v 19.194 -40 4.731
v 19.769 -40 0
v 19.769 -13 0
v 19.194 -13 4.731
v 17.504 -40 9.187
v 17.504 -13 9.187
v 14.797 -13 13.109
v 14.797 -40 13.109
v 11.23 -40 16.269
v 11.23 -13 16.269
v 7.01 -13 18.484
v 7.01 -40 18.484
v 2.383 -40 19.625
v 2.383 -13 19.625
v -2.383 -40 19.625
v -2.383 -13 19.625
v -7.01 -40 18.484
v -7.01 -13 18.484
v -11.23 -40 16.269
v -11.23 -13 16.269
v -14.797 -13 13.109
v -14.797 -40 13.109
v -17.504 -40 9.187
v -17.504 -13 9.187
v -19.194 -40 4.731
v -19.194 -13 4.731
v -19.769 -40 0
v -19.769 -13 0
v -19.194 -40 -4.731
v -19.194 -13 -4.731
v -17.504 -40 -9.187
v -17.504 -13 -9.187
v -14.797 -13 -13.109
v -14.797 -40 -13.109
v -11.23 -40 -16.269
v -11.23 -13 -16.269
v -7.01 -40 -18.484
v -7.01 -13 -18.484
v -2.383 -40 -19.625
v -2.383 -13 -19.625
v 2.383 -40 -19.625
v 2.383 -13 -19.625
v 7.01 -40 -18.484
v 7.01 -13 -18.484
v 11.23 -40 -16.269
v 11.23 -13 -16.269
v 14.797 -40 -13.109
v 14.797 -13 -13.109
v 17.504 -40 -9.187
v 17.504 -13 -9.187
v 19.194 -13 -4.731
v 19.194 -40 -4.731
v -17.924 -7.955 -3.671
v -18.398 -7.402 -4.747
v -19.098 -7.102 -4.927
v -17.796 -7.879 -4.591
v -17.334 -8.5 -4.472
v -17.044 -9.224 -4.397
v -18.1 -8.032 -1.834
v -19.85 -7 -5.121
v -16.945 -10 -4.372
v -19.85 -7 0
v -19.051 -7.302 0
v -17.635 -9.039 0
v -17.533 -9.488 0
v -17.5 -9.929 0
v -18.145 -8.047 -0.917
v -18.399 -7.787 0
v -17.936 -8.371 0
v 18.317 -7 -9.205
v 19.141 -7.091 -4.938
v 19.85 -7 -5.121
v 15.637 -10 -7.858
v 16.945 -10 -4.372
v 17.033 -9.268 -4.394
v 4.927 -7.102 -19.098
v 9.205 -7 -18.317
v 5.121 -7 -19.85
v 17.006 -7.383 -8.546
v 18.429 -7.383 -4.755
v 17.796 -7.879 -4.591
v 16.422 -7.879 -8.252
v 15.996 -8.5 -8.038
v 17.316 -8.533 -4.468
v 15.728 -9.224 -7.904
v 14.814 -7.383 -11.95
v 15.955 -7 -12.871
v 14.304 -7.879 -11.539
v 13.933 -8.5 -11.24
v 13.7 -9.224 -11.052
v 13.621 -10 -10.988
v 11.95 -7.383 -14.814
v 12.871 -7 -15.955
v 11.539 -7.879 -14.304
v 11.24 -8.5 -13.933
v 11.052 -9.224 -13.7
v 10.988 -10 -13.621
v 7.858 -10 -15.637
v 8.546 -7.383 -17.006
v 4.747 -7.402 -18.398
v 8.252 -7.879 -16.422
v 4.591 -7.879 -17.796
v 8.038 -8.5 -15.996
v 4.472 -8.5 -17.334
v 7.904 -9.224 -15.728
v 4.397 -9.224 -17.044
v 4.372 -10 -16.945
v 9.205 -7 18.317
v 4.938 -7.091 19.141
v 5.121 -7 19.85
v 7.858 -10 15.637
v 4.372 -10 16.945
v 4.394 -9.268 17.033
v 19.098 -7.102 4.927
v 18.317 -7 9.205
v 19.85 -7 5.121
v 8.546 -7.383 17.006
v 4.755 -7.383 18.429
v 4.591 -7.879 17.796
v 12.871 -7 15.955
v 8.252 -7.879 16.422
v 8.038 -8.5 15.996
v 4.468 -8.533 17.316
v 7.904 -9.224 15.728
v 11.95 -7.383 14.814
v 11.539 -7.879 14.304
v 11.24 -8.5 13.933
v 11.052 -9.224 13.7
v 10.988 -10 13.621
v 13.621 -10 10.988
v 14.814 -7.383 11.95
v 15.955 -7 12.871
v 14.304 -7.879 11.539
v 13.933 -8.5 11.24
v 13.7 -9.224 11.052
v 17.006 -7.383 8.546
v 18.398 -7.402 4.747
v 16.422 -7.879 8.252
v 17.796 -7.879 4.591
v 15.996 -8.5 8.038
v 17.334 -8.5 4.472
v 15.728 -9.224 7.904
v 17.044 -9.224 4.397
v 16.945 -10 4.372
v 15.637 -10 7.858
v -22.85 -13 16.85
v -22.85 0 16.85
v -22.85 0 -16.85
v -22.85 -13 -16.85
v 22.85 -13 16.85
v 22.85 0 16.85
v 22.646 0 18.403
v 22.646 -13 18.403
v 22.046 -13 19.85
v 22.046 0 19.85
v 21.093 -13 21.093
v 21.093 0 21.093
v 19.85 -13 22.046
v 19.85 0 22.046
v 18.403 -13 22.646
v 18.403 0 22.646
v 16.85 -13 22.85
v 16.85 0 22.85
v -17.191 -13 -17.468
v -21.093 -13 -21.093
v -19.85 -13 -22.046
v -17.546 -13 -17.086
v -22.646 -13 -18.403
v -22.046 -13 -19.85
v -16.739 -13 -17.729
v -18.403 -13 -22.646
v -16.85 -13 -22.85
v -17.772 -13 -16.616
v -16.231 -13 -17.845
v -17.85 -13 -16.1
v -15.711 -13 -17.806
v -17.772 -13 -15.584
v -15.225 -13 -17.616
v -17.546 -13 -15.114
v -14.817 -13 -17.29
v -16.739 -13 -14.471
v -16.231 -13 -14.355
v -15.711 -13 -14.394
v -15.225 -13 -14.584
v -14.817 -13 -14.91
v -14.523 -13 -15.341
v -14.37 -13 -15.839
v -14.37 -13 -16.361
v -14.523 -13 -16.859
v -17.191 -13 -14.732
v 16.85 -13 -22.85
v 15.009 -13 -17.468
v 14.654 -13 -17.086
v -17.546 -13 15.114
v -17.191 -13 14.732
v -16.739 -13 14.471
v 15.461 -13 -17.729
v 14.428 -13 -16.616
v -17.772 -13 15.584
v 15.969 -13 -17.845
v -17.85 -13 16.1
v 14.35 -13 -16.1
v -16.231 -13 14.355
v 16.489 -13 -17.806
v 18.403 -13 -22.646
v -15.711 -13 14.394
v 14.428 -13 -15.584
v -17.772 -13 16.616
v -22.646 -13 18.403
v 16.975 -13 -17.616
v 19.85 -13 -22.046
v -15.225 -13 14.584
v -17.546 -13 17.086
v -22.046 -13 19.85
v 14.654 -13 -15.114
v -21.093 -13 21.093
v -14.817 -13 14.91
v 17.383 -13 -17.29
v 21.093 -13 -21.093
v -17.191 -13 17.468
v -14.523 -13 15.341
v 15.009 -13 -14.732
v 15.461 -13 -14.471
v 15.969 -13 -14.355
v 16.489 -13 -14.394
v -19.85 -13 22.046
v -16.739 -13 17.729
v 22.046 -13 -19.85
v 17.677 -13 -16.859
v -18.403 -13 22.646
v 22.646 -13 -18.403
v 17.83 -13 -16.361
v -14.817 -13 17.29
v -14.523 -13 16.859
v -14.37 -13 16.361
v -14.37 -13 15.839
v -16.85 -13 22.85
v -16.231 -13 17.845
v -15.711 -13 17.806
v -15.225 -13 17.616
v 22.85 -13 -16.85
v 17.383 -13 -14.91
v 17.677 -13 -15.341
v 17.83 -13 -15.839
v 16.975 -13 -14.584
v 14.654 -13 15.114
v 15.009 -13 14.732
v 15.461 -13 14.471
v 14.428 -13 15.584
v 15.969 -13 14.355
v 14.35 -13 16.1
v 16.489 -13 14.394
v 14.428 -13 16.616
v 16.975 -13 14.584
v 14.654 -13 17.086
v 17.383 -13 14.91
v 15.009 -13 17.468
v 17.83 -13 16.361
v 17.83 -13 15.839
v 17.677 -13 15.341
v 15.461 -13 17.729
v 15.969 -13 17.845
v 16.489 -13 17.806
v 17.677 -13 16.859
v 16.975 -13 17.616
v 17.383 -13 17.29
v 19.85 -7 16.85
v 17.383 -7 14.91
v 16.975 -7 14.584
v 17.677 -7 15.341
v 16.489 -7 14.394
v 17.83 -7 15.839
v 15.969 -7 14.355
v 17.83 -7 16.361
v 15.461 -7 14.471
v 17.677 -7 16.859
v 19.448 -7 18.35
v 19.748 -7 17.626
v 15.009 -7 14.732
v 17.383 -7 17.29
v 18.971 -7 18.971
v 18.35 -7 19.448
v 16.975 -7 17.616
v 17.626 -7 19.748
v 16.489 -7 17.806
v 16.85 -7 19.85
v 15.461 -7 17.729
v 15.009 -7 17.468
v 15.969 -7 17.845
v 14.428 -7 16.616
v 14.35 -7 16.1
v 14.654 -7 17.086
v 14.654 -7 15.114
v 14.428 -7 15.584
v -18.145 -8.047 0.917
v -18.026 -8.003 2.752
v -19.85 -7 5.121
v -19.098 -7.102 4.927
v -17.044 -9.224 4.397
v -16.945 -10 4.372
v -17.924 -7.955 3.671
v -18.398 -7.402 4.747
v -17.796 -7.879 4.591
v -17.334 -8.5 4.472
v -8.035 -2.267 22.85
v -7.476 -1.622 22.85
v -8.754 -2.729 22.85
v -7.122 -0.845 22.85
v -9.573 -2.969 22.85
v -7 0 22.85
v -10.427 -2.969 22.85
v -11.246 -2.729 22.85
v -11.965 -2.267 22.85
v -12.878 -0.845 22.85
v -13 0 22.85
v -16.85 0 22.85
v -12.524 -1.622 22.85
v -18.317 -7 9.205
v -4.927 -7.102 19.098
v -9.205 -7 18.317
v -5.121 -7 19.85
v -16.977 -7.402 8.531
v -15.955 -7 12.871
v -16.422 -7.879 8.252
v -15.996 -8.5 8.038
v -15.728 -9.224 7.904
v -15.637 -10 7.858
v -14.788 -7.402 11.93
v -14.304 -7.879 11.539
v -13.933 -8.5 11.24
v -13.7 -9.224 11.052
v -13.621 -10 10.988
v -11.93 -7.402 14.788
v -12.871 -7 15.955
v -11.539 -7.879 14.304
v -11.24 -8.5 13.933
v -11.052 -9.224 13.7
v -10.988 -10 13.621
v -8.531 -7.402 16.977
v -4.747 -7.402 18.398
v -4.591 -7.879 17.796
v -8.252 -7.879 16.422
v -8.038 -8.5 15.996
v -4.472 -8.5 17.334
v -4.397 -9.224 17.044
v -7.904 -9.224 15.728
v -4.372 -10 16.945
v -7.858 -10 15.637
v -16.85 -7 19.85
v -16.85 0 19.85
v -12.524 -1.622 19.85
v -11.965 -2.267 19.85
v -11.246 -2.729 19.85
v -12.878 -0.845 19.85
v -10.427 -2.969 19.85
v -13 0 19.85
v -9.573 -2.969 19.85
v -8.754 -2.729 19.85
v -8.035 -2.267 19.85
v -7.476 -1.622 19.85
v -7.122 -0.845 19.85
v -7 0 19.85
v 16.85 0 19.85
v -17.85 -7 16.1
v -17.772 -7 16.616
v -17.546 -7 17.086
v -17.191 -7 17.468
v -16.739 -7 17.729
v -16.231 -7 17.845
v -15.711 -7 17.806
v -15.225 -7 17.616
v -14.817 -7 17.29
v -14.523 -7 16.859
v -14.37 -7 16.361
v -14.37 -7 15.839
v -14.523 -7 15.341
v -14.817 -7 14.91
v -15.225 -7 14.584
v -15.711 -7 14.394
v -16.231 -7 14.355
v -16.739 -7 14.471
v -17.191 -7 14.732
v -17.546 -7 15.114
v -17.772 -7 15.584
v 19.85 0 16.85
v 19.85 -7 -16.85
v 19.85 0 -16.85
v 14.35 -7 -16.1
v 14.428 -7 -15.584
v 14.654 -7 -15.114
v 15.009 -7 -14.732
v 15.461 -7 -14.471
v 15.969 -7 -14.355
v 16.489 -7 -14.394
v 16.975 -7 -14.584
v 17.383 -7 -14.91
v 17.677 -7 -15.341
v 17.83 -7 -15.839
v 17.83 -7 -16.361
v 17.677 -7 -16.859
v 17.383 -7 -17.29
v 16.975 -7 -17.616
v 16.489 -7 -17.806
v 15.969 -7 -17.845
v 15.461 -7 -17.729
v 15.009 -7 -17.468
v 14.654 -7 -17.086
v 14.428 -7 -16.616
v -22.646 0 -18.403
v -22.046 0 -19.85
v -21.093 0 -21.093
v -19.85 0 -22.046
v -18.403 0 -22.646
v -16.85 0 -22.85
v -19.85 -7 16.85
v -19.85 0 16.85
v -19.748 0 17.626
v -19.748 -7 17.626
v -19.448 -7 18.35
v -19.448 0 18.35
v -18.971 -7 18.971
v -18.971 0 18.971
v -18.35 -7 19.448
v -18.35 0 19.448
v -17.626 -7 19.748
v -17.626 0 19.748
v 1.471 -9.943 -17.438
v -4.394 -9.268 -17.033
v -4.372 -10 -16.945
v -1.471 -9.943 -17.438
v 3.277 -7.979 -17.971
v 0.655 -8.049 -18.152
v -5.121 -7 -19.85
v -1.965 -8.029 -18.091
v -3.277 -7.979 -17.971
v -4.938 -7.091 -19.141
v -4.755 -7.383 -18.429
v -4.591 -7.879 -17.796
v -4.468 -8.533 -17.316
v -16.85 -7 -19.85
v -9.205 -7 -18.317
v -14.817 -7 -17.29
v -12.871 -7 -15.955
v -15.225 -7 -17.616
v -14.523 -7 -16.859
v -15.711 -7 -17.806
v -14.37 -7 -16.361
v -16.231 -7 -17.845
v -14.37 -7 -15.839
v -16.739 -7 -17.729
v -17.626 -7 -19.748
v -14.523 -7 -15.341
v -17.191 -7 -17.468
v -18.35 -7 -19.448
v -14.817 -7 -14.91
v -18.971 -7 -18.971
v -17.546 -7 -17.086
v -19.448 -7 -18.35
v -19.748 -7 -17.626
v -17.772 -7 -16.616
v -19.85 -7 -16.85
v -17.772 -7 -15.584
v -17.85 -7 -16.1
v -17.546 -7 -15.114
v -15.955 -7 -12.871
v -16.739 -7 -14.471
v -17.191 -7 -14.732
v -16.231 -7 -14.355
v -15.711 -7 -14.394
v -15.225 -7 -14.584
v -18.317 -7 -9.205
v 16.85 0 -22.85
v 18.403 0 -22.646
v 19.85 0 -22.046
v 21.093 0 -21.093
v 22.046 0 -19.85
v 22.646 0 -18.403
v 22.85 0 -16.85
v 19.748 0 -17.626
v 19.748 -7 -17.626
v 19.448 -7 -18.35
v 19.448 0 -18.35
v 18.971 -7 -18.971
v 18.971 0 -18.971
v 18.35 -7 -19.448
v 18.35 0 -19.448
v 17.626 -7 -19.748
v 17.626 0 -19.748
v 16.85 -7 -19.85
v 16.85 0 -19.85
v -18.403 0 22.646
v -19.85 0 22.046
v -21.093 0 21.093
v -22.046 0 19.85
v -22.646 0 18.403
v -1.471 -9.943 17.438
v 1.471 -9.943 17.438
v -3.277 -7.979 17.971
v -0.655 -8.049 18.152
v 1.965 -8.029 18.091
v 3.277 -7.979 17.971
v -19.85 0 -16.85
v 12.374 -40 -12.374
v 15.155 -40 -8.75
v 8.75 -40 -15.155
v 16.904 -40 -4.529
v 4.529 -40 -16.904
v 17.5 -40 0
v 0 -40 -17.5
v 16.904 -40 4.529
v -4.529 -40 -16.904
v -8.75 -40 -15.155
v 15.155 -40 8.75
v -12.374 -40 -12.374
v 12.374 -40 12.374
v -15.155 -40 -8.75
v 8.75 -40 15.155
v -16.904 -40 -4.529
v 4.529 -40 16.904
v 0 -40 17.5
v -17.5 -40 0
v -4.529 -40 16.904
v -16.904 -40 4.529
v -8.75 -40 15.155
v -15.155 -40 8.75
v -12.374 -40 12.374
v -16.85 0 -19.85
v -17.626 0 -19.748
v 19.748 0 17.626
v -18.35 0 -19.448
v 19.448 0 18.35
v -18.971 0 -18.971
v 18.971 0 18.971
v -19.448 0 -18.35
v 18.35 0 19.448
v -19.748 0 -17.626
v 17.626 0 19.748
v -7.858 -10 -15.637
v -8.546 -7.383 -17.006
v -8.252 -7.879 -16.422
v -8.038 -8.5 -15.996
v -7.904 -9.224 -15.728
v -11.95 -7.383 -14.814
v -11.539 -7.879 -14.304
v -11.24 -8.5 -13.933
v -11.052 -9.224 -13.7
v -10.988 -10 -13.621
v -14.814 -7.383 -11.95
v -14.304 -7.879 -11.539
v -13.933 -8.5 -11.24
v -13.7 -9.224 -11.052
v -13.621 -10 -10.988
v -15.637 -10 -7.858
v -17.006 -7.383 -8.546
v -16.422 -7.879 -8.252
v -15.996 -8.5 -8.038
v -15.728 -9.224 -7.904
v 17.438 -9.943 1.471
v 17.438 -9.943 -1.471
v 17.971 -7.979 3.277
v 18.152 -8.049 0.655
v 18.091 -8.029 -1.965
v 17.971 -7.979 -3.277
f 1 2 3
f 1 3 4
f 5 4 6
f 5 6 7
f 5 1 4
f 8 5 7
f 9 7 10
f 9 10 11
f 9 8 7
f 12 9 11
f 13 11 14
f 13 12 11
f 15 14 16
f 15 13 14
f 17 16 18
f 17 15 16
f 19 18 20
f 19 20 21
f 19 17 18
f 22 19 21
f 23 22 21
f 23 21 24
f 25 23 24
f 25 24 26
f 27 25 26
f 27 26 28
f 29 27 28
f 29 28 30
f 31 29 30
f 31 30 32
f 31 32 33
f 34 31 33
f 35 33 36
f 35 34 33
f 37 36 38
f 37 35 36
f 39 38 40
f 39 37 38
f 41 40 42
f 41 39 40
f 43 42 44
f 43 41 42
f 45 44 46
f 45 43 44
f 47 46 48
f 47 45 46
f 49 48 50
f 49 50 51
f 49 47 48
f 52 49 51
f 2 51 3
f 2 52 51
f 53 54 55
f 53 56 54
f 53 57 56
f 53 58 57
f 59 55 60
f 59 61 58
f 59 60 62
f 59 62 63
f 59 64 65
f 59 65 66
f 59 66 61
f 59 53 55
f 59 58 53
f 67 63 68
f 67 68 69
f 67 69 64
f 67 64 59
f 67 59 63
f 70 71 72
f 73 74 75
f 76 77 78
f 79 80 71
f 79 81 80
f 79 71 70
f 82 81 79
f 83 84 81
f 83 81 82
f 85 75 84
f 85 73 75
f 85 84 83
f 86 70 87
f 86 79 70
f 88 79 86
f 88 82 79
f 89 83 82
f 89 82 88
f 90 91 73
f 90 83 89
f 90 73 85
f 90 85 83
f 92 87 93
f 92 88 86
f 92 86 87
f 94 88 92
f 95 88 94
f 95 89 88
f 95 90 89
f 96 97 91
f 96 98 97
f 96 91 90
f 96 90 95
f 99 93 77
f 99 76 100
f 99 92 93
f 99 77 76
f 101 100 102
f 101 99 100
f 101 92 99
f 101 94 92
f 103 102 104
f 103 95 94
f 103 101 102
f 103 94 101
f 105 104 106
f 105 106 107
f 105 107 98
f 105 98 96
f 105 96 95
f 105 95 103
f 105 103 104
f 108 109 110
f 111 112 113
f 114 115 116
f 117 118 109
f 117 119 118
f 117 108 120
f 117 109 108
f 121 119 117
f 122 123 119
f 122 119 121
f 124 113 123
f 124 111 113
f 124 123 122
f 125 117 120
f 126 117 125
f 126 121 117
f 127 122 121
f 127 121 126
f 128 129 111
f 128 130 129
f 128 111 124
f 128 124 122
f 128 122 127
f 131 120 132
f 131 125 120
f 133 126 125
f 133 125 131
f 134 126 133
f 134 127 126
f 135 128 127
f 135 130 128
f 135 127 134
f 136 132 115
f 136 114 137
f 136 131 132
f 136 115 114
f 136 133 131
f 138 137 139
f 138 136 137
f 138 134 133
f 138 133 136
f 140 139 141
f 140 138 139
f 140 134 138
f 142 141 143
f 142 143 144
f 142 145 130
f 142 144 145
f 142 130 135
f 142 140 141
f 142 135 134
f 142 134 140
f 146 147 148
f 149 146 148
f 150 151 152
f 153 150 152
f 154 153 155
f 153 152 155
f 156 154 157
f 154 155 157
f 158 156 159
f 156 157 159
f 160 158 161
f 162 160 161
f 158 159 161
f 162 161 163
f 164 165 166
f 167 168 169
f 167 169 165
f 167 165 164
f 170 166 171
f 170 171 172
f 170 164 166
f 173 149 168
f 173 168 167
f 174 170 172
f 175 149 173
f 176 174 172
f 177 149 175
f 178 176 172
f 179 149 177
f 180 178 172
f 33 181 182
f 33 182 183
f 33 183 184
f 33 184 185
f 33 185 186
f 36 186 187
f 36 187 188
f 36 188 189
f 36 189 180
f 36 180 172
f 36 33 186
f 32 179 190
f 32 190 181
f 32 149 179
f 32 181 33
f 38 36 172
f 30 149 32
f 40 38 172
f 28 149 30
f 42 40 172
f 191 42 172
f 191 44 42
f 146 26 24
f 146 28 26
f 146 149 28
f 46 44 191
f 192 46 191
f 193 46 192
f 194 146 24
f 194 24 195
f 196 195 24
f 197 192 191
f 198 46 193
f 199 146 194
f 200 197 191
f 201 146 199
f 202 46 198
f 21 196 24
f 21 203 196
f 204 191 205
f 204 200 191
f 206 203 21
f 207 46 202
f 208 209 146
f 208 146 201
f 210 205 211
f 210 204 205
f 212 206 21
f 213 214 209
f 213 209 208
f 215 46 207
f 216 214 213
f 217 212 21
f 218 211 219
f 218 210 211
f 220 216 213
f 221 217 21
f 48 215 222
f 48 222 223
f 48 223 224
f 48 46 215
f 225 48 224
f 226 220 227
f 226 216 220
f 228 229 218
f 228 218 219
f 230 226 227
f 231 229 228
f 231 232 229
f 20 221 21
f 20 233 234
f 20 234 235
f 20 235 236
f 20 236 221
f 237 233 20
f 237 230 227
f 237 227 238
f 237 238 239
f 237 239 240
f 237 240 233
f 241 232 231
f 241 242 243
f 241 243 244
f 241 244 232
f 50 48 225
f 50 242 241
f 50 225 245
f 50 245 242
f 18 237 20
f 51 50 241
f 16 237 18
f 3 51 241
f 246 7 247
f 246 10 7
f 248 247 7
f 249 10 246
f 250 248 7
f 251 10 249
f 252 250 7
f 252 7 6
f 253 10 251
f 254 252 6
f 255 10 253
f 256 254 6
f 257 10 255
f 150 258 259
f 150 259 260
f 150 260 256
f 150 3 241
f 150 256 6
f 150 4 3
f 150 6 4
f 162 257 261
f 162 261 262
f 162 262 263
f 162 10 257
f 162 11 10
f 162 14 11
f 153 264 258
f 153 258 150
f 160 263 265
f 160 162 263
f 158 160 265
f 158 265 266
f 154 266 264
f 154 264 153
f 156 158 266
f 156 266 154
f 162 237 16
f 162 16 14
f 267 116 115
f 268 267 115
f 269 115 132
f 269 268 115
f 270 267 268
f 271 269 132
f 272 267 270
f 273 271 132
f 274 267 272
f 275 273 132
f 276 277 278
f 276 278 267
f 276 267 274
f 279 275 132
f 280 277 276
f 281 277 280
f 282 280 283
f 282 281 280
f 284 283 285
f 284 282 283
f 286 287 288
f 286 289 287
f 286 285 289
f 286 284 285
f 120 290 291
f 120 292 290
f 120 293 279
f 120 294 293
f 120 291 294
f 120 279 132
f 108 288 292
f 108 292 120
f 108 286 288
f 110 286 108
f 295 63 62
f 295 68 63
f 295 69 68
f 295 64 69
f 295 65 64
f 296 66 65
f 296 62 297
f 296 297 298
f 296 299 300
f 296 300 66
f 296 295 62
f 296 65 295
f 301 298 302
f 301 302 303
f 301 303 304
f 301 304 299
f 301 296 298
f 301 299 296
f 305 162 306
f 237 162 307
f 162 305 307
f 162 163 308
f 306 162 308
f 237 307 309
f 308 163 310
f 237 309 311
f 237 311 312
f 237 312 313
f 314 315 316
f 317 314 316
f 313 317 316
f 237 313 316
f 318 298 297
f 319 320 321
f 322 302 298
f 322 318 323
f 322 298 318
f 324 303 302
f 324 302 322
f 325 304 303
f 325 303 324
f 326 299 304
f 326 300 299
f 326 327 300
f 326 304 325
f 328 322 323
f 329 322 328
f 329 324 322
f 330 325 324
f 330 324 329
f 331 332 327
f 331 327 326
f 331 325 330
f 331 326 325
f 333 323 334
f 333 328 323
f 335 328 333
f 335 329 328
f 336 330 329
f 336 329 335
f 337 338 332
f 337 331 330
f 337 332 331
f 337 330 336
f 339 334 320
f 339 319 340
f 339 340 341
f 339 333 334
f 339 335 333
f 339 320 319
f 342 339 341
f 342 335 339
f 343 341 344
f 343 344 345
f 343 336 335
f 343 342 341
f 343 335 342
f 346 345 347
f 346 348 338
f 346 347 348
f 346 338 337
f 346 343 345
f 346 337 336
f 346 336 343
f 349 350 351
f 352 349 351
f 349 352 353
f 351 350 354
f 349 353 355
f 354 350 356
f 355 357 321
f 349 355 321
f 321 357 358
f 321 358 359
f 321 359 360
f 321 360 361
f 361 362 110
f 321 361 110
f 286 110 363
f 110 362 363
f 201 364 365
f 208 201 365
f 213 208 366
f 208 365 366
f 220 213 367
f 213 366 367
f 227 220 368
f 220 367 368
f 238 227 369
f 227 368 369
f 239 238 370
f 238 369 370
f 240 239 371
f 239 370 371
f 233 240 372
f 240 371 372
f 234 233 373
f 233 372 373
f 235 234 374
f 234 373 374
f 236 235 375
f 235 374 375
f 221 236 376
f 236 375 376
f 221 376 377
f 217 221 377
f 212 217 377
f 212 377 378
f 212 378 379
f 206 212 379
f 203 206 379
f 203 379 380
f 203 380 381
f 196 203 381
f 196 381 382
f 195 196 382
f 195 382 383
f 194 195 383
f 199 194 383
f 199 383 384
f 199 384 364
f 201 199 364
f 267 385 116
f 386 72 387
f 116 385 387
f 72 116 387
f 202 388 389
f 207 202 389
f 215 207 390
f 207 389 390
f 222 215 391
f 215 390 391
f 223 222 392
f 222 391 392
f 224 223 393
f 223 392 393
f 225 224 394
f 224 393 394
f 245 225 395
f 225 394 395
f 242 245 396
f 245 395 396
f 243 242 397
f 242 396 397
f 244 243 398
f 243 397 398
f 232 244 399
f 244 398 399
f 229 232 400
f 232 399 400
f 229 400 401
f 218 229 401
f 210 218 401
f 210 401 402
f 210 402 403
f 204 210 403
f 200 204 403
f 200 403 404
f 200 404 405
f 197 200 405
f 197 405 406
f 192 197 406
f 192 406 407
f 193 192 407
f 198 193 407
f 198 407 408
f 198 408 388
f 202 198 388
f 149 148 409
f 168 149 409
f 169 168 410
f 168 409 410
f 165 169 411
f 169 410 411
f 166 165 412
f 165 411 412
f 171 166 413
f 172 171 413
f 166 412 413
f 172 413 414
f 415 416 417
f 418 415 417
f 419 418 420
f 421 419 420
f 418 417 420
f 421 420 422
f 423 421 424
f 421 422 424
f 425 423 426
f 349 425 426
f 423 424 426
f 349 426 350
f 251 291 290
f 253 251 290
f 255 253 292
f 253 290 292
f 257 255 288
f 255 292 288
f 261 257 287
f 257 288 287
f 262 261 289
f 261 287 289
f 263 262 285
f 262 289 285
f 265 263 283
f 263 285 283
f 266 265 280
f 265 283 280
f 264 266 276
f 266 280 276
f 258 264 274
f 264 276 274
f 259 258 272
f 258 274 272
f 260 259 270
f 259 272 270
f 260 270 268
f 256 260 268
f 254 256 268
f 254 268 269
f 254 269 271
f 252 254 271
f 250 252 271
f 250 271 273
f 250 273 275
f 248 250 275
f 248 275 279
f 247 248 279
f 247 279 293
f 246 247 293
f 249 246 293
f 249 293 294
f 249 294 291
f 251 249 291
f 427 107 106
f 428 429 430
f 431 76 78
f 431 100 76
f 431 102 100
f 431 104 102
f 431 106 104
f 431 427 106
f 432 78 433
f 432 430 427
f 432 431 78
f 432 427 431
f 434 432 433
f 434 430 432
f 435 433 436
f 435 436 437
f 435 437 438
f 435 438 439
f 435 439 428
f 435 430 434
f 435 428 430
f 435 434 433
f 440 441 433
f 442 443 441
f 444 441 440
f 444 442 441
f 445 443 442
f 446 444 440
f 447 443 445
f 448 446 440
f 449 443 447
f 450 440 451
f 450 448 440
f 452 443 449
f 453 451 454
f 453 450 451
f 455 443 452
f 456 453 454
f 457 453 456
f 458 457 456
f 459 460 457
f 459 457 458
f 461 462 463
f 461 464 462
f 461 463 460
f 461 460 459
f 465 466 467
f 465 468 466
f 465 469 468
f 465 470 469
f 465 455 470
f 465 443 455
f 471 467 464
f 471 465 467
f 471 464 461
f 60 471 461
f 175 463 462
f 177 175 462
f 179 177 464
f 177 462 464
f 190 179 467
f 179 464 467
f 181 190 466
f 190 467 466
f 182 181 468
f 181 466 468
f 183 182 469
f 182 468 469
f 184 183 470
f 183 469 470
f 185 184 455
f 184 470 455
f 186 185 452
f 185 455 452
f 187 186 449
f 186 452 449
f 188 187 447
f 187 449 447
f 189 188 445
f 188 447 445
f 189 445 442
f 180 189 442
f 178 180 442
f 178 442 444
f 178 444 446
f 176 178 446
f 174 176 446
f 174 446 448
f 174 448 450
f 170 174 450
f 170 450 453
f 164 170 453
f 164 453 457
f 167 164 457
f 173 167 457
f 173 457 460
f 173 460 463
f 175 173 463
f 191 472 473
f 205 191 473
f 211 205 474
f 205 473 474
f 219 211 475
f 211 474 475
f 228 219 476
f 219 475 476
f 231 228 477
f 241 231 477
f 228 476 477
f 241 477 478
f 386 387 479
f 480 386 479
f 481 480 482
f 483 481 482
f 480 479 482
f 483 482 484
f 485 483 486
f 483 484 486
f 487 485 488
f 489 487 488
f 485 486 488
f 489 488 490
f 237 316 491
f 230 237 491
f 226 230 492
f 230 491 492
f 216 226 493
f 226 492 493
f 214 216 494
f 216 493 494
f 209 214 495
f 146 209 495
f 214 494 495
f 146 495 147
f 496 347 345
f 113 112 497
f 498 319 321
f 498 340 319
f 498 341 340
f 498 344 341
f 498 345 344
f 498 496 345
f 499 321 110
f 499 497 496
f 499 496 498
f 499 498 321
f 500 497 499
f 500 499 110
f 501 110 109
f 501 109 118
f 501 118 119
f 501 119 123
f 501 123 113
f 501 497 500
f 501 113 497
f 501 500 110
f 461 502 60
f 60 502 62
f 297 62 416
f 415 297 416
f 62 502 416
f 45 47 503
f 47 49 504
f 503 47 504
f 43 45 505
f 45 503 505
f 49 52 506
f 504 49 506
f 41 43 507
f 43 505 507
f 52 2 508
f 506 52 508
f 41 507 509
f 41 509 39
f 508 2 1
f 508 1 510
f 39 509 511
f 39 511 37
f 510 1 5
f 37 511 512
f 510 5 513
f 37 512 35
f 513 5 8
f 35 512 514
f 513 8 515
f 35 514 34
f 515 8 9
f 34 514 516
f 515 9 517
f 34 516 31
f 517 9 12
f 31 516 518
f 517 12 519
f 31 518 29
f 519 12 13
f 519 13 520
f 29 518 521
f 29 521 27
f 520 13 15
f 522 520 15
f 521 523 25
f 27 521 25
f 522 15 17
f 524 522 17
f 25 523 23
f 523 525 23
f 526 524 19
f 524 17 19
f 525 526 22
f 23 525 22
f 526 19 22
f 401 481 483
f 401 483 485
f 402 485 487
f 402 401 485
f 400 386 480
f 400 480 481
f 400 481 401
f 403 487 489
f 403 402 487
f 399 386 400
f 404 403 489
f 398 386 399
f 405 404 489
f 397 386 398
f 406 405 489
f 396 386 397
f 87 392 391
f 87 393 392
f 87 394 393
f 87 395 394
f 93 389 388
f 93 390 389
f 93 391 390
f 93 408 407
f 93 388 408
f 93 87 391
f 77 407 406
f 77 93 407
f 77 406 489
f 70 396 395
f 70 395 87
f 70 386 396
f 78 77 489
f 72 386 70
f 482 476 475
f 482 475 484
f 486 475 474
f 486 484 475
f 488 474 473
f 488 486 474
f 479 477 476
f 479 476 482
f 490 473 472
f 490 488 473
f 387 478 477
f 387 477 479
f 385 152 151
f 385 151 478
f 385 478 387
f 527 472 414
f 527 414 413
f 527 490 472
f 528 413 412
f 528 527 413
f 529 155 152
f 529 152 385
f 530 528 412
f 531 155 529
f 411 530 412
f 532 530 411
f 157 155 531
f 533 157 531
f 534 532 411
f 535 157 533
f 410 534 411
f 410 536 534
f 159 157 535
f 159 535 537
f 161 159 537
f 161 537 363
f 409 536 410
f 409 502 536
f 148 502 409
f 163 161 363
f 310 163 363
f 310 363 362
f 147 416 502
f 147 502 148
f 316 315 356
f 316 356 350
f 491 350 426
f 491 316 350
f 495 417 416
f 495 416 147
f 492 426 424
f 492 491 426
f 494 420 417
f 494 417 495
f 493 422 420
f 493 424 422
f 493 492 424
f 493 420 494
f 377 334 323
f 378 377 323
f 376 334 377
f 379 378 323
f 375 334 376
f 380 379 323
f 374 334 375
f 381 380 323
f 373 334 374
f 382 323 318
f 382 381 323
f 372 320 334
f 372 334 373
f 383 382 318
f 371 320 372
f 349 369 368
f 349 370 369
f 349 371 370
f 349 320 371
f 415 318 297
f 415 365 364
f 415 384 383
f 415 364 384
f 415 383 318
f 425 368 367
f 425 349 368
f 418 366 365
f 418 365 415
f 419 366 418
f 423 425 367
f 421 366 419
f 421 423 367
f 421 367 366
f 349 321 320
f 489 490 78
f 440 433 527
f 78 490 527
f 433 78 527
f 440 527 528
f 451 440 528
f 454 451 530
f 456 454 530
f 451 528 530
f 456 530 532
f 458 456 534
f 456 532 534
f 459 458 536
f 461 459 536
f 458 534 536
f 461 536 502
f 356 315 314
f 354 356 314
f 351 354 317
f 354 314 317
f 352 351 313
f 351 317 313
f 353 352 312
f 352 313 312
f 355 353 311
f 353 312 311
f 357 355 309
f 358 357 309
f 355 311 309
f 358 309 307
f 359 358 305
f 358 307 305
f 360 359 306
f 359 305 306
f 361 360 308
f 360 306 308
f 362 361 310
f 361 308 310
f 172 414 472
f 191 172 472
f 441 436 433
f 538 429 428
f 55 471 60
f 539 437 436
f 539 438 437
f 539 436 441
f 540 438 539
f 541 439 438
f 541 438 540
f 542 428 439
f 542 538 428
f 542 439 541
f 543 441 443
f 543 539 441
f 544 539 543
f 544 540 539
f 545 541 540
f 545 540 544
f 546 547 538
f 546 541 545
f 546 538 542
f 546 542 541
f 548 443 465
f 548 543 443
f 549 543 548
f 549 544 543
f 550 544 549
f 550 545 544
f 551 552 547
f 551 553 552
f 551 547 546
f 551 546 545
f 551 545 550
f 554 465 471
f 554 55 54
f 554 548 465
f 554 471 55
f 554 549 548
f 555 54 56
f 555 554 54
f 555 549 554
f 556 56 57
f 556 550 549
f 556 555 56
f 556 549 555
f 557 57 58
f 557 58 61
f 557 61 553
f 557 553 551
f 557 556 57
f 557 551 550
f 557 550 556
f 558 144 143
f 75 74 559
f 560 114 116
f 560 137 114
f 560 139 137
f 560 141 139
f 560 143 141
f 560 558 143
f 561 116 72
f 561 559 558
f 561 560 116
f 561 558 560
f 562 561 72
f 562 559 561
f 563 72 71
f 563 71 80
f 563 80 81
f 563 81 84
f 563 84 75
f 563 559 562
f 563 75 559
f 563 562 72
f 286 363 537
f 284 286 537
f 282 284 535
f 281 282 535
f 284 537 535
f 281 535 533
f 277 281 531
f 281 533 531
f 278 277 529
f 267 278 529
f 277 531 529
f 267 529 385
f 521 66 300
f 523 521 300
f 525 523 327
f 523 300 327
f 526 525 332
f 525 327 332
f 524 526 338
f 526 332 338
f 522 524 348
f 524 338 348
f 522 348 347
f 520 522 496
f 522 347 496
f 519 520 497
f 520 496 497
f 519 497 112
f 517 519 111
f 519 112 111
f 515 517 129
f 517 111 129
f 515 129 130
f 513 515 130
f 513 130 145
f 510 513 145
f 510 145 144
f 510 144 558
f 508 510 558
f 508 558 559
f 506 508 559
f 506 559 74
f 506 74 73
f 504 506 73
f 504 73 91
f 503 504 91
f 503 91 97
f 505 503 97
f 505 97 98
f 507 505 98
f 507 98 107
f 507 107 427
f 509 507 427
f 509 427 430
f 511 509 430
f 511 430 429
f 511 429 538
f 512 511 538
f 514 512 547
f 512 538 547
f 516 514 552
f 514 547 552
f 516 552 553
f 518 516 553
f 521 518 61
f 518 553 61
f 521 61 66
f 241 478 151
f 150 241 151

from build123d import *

# Parameters (mm, degrees)
F1_DEPTH  = 40
F2_R      = 1.75
F2_R_2    = 17.5
F3_DEPTH  = 40
F5_DEPTH  = 7
F6_R      = 29.829499
F6_R_2    = 19.768838
F7_DEPTH  = 27
F8_R      = 3
F9_R      = 3
F10_DEPTH = 3


with BuildPart() as f1:
    # F0 (on Front) → F1 (new body)
    with BuildSketch(Plane.XZ):
        with BuildLine():
            Line((16.85, 22.85), (-16.85, 22.85))
            ThreePointArc((-16.85, 22.85), (-21.092641, 21.092641), (-22.85, 16.85))
            Line((-22.85, 16.85), (-22.85, -16.85))
            ThreePointArc((-22.85, -16.85), (-21.092641, -21.092641), (-16.85, -22.85))
            Line((-16.85, -22.85), (16.85, -22.85))
            ThreePointArc((16.85, -22.85), (21.092641, -21.092641), (22.85, -16.85))
            Line((22.85, -16.85), (22.85, 16.85))
            ThreePointArc((22.85, 16.85), (21.092641, 21.092641), (16.85, 22.85))
        make_face()
        with BuildLine():
            ThreePointArc((-19.85, 16.85), (-18.97132, 18.97132), (-16.85, 19.85))
            Line((-16.85, 19.85), (16.85, 19.85))
            ThreePointArc((16.85, 19.85), (18.97132, 18.97132), (19.85, 16.85))
            Line((19.85, 16.85), (19.85, -16.85))
            ThreePointArc((19.85, -16.85), (18.97132, -18.97132), (16.85, -19.85))
            Line((16.85, -19.85), (-16.85, -19.85))
            ThreePointArc((-16.85, -19.85), (-18.97132, -18.97132), (-19.85, -16.85))
            Line((-19.85, -16.85), (-19.85, 16.85))
        make_face(mode=Mode.SUBTRACT)
    extrude(amount=F1_DEPTH)

    # F2 (on face) → F3 (join, through all)
    with BuildSketch(Plane(origin=(0, 0, 0), x_dir=(-1, 0, 0), z_dir=(0, 1, 0))):
        with BuildLine():
            ThreePointArc((-16.85, 19.85), (-18.97132, 18.97132), (-19.85, 16.85))
            Line((-19.85, 16.85), (-19.85, -16.85))
            ThreePointArc((-19.85, -16.85), (-18.97132, -18.97132), (-16.85, -19.85))
            Line((-16.85, -19.85), (16.85, -19.85))
            ThreePointArc((16.85, -19.85), (18.97132, -18.97132), (19.85, -16.85))
            Line((19.85, -16.85), (19.85, 16.85))
            ThreePointArc((19.85, 16.85), (18.97132, 18.97132), (16.85, 19.85))
            Line((16.85, 19.85), (-16.85, 19.85))
        make_face()
        with Locations((-16.1, -16.1)):
            Circle(F2_R, mode=Mode.SUBTRACT)
        with Locations((16.1, -16.1)):
            Circle(F2_R, mode=Mode.SUBTRACT)
        with Locations((-16.1, 16.1)):
            Circle(F2_R, mode=Mode.SUBTRACT)
        Circle(F2_R_2, mode=Mode.SUBTRACT)
        with Locations((16.1, 16.1)):
            Circle(F2_R, mode=Mode.SUBTRACT)
    extrude(amount=-F3_DEPTH)

    # F4 (on face) → F5 (cut)
    with BuildSketch(Plane(origin=(0, 0, 0), x_dir=(-1, 0, 0), z_dir=(0, 1, 0))):
        with BuildLine():
            Line((19.85, -16.85), (19.85, 16.85))
            ThreePointArc((19.85, 16.85), (18.97132, 18.97132), (16.85, 19.85))
            Line((16.85, 19.85), (-16.85, 19.85))
            ThreePointArc((-16.85, 19.85), (-18.97132, 18.97132), (-19.85, 16.85))
            Line((-19.85, 16.85), (-19.85, -16.85))
            ThreePointArc((-19.85, -16.85), (-18.97132, -18.97132), (-16.85, -19.85))
            Line((-16.85, -19.85), (16.85, -19.85))
            ThreePointArc((16.85, -19.85), (18.97132, -18.97132), (19.85, -16.85))
        make_face()
    extrude(amount=-F5_DEPTH, mode=Mode.SUBTRACT)

    # F6 (on face) → F7 (cut)
    with BuildSketch(Plane.XZ.offset(40)):
        Circle(F6_R)
        Circle(F6_R_2, mode=Mode.SUBTRACT)
    extrude(amount=-F7_DEPTH, mode=Mode.SUBTRACT)

    # F8
    f8_edges = [f1.edges().sort_by_distance(p)[0] for p in [
        (17.5, -7, 0),
    ]]
    fillet(f8_edges, radius=F8_R)

    # F9 (on face) → F10 (cut, through all)
    with BuildSketch(Plane.XY.offset(22.85)):
        with Locations((-10, 0)):
            Circle(F9_R)
    extrude(amount=-F10_DEPTH, mode=Mode.SUBTRACT)


solid = f1.part
